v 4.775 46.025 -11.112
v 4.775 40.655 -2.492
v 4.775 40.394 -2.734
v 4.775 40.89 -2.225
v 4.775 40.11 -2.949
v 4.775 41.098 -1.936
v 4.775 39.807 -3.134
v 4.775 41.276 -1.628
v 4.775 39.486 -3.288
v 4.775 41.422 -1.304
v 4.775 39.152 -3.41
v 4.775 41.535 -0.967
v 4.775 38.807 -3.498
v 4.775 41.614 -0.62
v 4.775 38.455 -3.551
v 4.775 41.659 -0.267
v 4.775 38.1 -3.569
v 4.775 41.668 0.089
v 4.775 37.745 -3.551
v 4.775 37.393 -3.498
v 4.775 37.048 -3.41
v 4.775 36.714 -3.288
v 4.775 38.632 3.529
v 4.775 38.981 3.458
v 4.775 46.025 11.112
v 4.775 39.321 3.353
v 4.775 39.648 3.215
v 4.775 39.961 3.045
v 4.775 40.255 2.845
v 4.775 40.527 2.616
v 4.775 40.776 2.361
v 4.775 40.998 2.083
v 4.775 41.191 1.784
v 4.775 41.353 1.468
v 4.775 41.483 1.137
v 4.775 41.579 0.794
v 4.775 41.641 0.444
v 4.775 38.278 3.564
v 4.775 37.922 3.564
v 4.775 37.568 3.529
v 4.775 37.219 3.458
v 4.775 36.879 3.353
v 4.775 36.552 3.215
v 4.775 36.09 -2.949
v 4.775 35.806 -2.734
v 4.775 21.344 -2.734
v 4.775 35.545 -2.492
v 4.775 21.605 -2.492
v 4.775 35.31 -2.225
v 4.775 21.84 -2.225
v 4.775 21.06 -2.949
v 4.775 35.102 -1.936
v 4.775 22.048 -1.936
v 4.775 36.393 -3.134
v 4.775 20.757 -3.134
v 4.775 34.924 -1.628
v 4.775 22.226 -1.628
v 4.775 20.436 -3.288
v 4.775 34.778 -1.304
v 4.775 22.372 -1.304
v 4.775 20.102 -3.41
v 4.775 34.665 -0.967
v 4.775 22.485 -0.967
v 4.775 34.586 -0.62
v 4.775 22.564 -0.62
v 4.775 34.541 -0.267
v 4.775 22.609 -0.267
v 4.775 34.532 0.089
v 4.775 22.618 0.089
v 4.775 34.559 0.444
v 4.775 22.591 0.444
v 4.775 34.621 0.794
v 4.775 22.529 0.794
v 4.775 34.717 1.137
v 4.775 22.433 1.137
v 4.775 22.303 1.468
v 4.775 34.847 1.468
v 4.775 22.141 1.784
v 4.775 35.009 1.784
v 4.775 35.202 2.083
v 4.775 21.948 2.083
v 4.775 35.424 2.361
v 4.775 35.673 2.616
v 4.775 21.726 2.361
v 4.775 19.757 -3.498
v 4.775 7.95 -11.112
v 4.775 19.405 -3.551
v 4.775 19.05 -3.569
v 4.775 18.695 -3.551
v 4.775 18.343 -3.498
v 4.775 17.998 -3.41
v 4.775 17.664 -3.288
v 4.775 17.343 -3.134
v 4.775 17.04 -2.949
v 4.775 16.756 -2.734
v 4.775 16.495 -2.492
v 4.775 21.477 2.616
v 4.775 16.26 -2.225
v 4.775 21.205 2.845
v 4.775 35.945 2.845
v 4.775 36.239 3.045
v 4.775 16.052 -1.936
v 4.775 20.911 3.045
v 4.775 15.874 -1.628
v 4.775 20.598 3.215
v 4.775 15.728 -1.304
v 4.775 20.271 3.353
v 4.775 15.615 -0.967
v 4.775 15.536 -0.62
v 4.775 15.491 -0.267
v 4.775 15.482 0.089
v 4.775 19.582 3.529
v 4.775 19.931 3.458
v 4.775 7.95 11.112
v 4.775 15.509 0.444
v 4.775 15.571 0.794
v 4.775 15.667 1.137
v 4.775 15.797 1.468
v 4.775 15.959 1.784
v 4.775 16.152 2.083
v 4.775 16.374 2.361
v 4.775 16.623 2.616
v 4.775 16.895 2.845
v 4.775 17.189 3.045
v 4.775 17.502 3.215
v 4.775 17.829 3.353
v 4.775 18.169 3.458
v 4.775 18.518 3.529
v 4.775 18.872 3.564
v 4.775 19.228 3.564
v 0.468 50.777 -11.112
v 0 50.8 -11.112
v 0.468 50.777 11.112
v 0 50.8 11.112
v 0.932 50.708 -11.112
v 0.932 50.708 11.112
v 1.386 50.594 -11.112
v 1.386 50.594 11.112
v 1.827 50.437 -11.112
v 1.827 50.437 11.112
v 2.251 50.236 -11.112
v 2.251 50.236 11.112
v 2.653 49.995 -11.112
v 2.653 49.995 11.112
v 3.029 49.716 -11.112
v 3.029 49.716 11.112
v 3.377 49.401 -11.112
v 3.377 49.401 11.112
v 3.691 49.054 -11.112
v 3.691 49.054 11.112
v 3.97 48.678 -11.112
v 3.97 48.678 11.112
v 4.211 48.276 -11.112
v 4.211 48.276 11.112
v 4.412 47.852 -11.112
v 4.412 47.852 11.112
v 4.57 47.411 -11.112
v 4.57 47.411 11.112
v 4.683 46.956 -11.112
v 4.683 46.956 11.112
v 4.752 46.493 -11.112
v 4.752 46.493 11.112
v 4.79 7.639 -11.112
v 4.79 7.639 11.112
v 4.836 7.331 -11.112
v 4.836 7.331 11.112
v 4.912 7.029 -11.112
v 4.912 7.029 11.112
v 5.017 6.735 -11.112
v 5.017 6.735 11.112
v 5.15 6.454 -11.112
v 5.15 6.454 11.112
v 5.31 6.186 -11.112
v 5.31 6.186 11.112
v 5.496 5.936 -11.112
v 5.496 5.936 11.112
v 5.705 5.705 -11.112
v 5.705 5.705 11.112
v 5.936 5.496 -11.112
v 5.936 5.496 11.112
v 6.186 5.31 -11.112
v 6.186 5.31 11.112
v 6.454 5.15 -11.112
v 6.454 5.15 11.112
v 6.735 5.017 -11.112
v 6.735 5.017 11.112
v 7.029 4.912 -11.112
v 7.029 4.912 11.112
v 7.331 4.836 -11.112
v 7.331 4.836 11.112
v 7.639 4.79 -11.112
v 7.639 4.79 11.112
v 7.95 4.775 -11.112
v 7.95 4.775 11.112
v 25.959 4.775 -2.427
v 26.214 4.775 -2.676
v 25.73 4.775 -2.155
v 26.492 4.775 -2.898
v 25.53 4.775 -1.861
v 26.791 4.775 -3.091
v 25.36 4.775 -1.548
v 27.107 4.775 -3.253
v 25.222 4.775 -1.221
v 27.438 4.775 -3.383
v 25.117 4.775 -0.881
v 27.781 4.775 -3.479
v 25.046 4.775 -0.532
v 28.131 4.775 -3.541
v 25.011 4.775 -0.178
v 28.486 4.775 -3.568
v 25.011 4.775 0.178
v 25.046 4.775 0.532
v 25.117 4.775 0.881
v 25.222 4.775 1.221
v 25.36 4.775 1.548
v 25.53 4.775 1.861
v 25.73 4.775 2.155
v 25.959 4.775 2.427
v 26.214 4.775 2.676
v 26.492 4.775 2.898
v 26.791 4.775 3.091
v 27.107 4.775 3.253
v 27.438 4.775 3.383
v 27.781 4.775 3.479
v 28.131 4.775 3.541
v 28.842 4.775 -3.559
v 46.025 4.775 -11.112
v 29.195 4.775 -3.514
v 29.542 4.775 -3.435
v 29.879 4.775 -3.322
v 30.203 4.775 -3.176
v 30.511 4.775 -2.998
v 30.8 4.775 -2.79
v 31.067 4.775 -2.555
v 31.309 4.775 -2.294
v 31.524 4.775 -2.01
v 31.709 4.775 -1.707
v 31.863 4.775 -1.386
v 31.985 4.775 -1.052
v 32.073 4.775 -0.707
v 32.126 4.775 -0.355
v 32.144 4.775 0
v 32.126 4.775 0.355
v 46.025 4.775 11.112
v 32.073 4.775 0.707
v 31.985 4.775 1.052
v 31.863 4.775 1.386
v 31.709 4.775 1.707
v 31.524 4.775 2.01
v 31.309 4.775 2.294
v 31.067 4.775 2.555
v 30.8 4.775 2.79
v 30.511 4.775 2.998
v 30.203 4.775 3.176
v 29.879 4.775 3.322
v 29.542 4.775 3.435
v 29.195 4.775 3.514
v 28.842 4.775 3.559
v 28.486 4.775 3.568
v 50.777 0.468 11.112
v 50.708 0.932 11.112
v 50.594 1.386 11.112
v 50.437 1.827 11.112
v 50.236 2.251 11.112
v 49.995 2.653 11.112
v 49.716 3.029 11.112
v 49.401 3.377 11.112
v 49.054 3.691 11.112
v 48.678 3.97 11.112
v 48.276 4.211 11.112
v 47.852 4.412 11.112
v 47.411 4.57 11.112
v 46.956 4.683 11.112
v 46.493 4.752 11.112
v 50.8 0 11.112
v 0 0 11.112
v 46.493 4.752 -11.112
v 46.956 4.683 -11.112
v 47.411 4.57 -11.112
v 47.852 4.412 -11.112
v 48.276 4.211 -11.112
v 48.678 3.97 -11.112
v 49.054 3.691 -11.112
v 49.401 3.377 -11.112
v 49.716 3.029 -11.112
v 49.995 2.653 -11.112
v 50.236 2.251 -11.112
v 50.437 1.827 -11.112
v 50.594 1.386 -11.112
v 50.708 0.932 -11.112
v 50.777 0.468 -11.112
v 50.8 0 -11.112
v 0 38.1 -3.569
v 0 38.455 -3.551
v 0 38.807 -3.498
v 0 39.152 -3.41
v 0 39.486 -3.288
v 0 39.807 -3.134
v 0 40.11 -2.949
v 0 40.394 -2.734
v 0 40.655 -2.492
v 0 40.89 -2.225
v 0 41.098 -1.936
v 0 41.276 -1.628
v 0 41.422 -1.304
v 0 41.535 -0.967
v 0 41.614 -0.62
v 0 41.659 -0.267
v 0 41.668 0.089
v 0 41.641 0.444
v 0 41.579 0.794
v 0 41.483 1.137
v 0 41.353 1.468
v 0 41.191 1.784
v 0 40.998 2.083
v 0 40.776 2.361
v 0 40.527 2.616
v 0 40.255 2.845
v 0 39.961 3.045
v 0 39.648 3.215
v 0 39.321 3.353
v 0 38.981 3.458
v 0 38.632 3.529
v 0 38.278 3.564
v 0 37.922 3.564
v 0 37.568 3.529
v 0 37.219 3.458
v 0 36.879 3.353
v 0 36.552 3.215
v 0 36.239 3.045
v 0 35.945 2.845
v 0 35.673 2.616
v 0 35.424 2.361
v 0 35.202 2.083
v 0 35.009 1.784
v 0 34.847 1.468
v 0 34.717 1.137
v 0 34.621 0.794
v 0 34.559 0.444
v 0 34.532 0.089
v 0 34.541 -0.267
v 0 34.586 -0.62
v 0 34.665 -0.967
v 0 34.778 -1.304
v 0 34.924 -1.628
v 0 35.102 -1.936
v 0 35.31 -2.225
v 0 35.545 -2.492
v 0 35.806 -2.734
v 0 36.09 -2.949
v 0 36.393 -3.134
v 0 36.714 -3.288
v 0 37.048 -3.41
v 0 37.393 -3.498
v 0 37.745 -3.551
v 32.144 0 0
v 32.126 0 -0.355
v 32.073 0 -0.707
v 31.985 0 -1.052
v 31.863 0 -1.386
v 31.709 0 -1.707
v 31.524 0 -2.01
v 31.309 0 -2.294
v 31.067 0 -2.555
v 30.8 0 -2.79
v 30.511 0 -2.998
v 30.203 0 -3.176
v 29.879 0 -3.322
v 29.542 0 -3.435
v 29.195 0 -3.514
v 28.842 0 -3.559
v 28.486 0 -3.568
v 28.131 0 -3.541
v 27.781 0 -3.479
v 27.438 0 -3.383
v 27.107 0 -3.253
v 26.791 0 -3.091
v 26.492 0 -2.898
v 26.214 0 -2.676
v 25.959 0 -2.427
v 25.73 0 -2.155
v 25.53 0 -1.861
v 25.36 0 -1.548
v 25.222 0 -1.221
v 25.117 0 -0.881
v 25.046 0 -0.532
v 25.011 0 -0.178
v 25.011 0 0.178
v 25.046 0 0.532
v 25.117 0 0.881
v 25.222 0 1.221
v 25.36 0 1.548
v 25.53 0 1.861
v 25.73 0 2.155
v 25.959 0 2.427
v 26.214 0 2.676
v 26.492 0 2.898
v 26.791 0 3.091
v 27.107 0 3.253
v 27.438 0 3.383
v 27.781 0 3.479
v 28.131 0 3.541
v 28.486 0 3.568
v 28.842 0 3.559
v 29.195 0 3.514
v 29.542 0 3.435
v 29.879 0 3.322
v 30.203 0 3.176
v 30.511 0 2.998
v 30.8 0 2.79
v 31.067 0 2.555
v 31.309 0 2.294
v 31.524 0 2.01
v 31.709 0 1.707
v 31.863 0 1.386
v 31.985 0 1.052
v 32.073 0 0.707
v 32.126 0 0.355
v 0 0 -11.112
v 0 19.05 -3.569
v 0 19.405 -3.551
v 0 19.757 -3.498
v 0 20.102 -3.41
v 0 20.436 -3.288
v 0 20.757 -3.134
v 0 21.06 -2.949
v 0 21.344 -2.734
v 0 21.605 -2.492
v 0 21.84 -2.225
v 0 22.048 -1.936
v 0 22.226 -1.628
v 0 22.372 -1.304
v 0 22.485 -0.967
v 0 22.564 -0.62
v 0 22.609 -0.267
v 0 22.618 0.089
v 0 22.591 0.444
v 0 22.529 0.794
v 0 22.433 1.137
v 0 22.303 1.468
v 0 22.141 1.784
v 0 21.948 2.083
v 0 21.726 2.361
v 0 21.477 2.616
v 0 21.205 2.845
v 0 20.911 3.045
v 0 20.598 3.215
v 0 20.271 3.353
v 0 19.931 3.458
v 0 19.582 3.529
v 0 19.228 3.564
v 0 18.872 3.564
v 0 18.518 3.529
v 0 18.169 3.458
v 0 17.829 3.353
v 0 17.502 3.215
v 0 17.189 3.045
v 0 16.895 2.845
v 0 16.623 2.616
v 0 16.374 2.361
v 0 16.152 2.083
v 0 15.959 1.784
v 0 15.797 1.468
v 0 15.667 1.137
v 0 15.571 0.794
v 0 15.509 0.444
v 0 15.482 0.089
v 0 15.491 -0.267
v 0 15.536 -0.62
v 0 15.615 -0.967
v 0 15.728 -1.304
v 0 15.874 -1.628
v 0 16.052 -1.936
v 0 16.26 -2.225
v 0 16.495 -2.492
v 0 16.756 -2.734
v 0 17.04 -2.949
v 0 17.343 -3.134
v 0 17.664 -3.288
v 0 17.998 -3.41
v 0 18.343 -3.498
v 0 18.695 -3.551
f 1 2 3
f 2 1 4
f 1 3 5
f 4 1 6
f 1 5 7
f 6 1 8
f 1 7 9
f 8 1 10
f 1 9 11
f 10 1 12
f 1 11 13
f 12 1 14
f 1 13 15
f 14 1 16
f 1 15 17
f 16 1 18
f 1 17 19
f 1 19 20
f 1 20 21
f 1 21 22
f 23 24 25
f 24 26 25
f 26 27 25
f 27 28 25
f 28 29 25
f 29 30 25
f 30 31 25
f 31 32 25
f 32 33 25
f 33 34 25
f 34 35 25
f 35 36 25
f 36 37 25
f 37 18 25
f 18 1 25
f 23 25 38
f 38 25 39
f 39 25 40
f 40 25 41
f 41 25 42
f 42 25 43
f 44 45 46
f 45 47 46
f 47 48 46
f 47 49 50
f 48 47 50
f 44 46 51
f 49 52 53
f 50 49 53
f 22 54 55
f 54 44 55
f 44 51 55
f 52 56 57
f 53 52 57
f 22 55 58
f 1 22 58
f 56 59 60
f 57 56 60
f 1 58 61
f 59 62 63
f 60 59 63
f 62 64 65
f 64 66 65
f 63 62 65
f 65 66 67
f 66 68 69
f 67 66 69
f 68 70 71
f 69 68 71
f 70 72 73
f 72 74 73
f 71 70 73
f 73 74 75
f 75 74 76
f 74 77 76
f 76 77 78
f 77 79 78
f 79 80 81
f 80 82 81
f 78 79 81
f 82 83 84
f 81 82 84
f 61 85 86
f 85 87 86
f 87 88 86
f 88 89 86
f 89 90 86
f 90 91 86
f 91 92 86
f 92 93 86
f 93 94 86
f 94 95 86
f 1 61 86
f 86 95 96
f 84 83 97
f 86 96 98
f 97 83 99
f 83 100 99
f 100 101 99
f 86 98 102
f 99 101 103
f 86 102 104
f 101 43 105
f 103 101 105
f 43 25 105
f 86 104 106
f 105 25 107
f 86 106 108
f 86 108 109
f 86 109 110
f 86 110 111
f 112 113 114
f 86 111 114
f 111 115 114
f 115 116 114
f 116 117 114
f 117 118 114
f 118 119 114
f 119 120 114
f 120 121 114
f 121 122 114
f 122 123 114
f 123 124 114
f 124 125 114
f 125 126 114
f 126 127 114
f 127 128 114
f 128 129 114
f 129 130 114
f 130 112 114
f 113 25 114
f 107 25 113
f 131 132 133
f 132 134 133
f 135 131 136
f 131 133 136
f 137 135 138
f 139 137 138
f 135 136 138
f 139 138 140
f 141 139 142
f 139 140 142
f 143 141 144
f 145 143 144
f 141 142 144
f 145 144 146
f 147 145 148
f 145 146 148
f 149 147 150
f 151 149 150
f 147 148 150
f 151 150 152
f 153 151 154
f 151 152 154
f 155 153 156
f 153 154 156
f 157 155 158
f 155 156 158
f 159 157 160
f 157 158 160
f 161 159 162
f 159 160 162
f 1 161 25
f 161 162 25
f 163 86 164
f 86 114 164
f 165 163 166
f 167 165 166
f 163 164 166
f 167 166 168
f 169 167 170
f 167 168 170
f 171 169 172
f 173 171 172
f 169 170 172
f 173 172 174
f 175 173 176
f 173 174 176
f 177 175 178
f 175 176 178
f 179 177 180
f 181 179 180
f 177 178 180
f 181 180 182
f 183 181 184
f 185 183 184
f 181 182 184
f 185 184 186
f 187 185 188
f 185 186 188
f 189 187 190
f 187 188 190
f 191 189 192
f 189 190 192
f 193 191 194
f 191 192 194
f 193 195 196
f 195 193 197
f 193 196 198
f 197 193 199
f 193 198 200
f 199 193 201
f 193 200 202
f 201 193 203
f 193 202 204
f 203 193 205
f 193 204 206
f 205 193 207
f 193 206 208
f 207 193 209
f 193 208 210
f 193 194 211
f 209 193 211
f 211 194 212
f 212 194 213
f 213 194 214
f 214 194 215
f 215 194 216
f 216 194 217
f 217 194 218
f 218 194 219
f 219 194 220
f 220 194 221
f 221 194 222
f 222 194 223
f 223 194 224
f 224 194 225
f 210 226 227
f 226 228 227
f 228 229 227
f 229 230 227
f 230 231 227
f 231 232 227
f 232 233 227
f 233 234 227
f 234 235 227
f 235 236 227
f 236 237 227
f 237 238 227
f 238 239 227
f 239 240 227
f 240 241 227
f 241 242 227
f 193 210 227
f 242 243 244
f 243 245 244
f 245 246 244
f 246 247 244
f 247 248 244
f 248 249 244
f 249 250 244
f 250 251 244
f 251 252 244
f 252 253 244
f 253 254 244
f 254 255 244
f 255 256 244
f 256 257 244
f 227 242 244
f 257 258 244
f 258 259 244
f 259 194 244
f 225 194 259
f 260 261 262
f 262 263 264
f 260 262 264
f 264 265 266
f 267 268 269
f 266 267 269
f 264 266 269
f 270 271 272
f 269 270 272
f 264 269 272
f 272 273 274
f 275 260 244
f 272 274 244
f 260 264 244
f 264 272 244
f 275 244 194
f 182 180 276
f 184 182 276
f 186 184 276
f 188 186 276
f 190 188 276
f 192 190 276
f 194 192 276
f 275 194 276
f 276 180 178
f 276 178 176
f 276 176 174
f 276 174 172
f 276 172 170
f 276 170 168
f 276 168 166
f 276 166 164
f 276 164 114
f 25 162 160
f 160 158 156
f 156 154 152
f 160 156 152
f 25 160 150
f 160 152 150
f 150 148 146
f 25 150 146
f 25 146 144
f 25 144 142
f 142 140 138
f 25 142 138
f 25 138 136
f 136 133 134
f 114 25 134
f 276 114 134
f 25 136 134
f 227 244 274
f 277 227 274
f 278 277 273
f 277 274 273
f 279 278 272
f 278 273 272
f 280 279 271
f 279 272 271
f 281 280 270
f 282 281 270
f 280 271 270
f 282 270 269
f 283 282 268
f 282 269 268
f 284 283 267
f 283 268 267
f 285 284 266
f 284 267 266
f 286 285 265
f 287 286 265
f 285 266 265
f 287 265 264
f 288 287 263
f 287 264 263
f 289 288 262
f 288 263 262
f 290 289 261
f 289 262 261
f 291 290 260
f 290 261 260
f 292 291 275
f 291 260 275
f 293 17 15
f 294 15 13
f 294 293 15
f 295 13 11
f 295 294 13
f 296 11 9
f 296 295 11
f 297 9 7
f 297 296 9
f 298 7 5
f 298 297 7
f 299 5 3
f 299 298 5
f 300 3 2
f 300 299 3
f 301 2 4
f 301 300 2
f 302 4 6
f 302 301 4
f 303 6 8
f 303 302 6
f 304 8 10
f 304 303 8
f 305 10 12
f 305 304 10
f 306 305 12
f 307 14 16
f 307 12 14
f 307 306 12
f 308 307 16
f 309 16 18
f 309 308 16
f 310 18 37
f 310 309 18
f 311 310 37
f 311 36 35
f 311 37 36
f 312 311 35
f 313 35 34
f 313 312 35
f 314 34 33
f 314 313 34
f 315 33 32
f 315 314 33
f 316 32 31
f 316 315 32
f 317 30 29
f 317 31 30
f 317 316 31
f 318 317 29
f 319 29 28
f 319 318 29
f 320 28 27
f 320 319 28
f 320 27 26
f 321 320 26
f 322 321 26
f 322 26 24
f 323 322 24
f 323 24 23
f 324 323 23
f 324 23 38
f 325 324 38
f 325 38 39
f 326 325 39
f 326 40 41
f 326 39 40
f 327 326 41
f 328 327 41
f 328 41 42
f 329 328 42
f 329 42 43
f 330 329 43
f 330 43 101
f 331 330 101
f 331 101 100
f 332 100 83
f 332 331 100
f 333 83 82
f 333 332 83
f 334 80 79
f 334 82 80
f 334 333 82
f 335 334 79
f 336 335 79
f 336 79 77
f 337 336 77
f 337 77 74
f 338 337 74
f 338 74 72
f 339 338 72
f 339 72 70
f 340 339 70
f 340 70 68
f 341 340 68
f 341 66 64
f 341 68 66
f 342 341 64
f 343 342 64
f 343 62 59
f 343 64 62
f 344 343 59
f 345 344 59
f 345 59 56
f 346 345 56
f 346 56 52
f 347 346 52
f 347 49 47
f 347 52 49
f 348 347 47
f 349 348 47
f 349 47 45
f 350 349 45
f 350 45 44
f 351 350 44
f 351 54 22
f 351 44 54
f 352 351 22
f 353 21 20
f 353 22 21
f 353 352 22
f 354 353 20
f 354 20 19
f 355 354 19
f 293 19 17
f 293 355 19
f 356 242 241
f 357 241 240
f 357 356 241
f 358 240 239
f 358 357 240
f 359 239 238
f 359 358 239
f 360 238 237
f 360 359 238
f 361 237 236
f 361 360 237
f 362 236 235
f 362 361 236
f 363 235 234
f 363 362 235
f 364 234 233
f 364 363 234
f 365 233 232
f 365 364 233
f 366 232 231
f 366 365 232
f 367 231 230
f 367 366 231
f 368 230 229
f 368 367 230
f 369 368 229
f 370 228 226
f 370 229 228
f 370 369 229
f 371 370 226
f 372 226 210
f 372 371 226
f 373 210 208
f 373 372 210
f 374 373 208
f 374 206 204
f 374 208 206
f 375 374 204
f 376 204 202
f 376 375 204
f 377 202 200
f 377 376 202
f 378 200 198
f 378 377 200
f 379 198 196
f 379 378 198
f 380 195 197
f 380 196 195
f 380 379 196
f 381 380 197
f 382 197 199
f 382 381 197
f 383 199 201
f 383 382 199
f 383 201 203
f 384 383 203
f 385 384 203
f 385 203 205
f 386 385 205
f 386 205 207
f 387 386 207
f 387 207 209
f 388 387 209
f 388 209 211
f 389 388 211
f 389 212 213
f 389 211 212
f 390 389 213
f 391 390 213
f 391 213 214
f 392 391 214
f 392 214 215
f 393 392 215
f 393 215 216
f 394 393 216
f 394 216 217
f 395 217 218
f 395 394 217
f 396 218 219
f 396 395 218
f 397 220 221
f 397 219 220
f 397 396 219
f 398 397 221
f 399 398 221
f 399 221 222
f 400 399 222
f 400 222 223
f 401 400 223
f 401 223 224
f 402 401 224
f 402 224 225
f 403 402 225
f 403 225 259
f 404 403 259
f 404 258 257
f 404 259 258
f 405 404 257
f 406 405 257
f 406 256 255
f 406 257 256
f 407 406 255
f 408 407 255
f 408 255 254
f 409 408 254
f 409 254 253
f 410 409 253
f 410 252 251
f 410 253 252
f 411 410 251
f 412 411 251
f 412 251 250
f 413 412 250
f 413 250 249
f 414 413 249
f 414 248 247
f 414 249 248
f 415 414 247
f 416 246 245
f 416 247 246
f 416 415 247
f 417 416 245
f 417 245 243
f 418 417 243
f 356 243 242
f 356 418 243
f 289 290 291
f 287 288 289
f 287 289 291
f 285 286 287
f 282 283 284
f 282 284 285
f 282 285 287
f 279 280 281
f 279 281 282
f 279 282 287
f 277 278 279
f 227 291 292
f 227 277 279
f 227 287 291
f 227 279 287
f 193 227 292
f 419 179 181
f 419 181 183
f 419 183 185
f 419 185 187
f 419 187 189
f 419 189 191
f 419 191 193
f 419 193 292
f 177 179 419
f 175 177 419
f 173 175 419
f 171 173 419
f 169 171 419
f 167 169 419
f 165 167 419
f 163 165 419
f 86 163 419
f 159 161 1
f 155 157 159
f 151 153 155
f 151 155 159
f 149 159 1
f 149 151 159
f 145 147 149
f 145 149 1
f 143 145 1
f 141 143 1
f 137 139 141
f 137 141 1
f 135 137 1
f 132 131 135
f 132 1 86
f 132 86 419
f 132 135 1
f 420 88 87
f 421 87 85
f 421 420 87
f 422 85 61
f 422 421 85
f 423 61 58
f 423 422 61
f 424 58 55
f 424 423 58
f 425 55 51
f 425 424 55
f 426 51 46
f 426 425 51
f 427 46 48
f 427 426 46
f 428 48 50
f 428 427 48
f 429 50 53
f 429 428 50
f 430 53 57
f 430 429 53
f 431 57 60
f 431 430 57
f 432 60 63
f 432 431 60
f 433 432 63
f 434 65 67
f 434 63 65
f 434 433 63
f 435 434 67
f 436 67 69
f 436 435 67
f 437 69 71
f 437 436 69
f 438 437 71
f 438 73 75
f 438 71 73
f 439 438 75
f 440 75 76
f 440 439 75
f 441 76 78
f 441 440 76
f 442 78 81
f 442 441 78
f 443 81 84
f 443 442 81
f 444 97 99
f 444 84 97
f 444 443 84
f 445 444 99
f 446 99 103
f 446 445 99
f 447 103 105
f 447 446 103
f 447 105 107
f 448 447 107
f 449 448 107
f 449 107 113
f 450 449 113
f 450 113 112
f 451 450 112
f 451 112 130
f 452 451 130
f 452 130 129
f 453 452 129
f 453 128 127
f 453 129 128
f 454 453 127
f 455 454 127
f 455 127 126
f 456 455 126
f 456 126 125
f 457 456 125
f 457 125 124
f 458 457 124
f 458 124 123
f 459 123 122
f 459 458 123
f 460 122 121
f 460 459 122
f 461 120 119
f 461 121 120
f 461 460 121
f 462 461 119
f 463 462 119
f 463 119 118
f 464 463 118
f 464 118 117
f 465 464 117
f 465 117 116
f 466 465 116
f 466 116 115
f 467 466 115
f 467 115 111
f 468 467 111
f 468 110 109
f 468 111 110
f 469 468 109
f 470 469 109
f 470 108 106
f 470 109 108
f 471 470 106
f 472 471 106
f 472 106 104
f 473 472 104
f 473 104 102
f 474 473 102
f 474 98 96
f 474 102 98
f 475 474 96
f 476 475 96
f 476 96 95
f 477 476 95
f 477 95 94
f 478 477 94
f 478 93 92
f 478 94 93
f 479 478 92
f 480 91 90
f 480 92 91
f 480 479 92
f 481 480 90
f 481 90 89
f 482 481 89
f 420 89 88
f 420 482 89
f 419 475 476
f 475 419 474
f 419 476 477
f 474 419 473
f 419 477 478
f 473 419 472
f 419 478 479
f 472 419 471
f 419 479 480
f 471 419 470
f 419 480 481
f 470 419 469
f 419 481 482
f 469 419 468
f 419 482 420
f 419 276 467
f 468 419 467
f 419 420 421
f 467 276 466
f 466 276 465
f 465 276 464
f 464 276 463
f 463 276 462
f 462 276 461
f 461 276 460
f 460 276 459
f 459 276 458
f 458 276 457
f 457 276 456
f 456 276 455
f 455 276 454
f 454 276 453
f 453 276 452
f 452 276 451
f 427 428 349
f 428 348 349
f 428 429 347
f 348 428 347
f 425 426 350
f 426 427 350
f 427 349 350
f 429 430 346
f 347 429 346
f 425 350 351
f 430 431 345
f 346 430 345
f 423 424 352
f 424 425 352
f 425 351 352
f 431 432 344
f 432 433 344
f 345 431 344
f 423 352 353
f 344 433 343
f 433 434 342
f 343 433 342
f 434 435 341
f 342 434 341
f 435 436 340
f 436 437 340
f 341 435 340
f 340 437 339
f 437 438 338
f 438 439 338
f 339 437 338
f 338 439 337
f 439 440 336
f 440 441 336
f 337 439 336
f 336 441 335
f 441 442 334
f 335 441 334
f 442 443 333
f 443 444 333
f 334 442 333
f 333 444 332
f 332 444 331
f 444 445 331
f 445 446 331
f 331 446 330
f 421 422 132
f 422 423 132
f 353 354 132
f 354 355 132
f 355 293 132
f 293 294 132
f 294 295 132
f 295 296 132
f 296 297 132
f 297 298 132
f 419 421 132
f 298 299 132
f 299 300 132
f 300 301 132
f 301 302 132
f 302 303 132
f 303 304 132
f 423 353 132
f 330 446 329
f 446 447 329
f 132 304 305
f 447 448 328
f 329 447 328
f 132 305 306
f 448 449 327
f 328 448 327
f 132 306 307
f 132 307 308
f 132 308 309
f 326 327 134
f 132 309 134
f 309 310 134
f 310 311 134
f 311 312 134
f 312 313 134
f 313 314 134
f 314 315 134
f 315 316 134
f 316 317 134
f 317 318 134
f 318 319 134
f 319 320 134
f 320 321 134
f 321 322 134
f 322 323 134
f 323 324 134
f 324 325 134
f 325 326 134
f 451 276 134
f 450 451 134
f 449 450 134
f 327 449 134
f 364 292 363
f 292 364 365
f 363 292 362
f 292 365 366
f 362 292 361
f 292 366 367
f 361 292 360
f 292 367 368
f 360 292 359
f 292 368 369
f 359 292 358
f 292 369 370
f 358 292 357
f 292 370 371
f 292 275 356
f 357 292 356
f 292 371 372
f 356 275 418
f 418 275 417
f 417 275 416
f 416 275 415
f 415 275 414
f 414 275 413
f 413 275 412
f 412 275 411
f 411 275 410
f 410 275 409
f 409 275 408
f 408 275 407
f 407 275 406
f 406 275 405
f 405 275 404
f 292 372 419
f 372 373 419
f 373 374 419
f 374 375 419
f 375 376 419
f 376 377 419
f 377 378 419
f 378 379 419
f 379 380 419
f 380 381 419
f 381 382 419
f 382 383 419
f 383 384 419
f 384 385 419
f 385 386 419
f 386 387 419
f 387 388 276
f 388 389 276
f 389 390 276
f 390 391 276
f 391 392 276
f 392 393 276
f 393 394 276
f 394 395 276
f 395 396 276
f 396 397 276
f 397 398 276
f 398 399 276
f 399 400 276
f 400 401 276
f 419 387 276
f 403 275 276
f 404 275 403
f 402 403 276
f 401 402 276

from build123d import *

# Parameters (mm, degrees)
BOSS_EXTRUDE1_DEPTH = 11.1125
SKETCH2_R           = 3.5687
CUT_EXTRUDE1_DEPTH  = 51.8
SKETCH3_R           = 3.5687
CUT_EXTRUDE2_DEPTH  = 51.8


with BuildPart() as part:
    # Sketch1 → Boss-Extrude1 (new body, symmetric)
    with BuildSketch(Plane.XY):
        with BuildLine():
            Line((0, 0), (0, 50.8))
            ThreePointArc((0, 50.8), (3.376576302, 49.401376302), (4.7752, 46.0248))
            Line((4.7752, 46.0248), (4.7752, 7.9502))
            ThreePointArc((4.7752, 7.9502), (5.70513597, 5.70513597), (7.9502, 4.7752))
            Line((7.9502, 4.7752), (46.0248, 4.7752))
            ThreePointArc((46.0248, 4.7752), (49.401376302, 3.376576302), (50.8, 0))
            Line((50.8, 0), (0, 0))
        make_face()
    extrude(amount=BOSS_EXTRUDE1_DEPTH, both=True)

    # Sketch2 → Cut-Extrude1 (cut, through all)
    with BuildSketch(Plane(origin=(0, 0, 0), x_dir=(1, 0, 0), z_dir=(0, 1, 0))):
        with Locations((28.575, 0)):
            Circle(SKETCH2_R)
    extrude(amount=CUT_EXTRUDE1_DEPTH, mode=Mode.SUBTRACT)

    # Sketch3 → Cut-Extrude2 (cut, through all)
    with BuildSketch(Plane(origin=(0, 0, 0), x_dir=(0, 0, -1), z_dir=(1, 0, 0))):
        with Locations((0, 19.05)):
            Circle(SKETCH3_R)
        with Locations((0, 38.1)):
            Circle(SKETCH3_R)
    extrude(amount=CUT_EXTRUDE2_DEPTH, mode=Mode.SUBTRACT)


solid = part.part
